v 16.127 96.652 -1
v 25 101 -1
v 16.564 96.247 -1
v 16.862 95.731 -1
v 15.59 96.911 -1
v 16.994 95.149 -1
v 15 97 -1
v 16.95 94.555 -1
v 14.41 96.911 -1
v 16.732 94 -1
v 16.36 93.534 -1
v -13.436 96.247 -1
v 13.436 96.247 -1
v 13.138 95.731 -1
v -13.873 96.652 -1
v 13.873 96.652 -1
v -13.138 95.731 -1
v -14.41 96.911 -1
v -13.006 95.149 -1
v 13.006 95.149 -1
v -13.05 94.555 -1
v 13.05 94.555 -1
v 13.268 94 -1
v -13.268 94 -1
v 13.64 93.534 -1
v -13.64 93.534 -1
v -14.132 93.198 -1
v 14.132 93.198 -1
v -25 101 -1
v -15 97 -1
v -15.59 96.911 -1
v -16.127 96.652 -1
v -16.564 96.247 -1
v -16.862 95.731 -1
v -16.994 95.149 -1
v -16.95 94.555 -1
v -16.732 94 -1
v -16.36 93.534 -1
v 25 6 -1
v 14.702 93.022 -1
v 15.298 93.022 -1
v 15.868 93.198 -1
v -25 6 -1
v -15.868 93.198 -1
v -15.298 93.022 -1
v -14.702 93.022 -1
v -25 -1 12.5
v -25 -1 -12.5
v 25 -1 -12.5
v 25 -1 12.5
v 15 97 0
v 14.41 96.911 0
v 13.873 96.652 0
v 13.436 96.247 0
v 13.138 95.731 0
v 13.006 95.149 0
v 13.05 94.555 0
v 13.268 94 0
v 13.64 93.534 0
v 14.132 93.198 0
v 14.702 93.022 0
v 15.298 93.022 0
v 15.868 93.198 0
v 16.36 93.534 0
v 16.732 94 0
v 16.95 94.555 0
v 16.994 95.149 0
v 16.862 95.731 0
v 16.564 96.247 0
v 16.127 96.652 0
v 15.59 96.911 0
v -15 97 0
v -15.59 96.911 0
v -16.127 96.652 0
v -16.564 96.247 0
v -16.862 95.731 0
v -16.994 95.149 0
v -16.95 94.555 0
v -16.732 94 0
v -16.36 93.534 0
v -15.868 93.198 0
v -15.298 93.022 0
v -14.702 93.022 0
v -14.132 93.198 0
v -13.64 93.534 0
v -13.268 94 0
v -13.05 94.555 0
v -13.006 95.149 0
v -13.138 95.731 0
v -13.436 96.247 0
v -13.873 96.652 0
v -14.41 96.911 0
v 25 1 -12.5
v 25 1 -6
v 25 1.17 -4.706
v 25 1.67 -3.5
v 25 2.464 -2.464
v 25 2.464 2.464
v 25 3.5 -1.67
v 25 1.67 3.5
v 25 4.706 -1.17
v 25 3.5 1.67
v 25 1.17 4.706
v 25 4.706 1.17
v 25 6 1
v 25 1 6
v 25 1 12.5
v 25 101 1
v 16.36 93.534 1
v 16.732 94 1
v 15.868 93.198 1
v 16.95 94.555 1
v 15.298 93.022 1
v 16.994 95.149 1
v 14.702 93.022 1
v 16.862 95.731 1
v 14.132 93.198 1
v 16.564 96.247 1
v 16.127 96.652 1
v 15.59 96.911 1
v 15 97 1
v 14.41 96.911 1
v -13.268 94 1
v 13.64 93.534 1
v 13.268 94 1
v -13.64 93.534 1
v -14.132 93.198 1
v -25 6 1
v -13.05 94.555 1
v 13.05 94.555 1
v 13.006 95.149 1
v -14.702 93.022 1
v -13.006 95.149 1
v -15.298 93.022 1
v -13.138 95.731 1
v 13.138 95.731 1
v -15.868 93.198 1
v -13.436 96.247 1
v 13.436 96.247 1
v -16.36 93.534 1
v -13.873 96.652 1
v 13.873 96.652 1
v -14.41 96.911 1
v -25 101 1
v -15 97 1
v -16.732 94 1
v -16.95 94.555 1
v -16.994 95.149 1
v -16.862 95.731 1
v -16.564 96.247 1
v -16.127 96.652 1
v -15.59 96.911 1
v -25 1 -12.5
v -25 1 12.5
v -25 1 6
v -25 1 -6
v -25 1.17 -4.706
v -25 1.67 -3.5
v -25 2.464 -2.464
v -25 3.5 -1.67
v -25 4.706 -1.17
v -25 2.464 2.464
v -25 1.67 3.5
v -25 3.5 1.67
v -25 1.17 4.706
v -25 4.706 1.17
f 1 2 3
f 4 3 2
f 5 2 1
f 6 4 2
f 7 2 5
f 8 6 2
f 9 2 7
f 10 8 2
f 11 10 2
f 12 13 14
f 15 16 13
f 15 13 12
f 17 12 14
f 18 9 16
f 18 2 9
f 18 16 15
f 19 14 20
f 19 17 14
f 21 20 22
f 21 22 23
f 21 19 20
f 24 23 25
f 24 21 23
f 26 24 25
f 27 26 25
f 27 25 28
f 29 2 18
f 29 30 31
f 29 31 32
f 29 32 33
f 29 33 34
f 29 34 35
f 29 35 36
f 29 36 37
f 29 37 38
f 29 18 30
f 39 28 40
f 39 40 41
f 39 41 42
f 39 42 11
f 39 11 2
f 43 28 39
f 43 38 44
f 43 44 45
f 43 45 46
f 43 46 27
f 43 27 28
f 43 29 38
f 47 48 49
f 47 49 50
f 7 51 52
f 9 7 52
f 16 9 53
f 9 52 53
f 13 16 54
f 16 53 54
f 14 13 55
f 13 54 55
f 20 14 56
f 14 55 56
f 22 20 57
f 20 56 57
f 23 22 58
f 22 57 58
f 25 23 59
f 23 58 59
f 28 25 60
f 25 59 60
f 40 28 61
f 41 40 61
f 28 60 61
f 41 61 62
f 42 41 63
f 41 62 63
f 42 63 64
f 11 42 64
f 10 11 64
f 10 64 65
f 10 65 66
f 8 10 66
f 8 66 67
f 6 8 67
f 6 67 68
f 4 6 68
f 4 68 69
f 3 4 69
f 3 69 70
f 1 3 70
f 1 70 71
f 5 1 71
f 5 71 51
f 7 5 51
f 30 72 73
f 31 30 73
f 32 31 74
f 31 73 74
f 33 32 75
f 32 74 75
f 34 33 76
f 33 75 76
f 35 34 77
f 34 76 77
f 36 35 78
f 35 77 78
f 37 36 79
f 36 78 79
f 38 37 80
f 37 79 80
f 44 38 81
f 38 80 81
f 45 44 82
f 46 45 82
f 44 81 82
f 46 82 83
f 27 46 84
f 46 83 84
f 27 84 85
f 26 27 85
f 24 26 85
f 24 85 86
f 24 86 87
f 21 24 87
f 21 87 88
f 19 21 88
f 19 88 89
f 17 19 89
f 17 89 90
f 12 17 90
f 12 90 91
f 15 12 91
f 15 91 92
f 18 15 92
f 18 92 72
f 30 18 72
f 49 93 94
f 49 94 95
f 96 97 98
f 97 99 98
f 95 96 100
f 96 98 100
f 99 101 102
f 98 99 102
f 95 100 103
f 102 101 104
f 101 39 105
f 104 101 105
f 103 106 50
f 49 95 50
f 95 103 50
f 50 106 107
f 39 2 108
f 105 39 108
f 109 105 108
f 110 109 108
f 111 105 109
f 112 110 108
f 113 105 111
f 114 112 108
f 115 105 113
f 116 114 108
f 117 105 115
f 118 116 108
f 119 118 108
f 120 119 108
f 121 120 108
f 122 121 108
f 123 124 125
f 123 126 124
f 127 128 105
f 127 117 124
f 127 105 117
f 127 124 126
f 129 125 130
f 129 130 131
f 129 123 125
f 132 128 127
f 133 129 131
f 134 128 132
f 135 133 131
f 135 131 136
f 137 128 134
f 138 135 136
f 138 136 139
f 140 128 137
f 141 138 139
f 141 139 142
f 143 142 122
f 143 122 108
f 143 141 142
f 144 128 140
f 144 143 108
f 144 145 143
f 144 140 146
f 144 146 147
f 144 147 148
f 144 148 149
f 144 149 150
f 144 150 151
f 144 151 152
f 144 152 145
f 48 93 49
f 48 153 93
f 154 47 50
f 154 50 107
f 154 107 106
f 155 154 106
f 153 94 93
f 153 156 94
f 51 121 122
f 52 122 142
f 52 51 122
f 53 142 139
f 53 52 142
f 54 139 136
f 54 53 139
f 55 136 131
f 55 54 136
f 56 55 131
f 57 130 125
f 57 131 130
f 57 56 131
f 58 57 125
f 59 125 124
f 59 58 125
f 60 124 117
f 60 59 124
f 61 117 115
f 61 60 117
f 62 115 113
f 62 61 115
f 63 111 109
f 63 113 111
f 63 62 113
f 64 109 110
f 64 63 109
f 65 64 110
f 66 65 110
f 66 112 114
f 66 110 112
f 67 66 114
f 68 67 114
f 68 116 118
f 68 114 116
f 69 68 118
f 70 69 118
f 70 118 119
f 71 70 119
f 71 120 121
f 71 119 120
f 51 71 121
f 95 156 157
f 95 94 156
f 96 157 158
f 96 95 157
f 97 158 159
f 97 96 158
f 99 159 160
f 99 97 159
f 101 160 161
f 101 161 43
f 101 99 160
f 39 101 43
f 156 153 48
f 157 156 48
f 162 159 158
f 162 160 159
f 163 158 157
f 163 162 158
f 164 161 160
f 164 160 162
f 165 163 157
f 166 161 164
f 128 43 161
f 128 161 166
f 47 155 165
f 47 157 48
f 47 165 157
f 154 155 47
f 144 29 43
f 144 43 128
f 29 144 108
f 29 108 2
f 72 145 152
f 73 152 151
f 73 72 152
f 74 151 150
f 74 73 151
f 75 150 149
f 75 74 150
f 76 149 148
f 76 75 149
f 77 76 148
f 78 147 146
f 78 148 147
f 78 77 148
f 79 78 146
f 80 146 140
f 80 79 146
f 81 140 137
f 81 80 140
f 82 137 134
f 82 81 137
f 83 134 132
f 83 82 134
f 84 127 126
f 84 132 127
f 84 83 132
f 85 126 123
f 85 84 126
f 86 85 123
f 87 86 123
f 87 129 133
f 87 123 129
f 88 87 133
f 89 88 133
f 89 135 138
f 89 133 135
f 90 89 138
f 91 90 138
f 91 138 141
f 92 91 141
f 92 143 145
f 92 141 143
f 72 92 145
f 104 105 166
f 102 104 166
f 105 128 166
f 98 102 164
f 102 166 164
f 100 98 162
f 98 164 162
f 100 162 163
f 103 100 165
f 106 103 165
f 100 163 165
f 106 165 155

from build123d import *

# Parameters (mm, degrees)
PAD_DEPTH            = 25
FILLET_R             = 5
SKETCH001_R          = 2
POCKET_DEPTH         = 12.501
POCKET_DEPTH_BACK    = -12.501
BODY_PLACEMENT_ANGLE = 270


with BuildPart() as part:
    # Sketch → Pad (new body, symmetric)
    with BuildSketch(Plane.XY):
        Polygon((-12.5, 1), (-12.5, -1), (12.5, -1), (12.5, 1), (1, 1), (1, 101), (-1, 101), (-1, 1), align=None)
    extrude(amount=PAD_DEPTH, both=True)

    # Fillet
    fillet_edges = [part.edges().sort_by_distance(p)[0] for p in [
        (-1, 1, 0),
        (1, 1, 0),
    ]]
    fillet(fillet_edges, radius=FILLET_R)

    # Sketch001 → Pocket (cut, two sides)
    with BuildSketch(Plane.YZ) as pocket_sk:
        with Locations((95, 15)):
            Circle(SKETCH001_R)
        with Locations((95, -15)):
            Circle(SKETCH001_R)
    extrude(amount=-POCKET_DEPTH, mode=Mode.SUBTRACT)
    extrude(pocket_sk.sketch, amount=-POCKET_DEPTH_BACK, mode=Mode.SUBTRACT)


with BuildPart() as part_1:
    # Body placement: moved
    add(part.part.rotate(Axis((0, 0, 0), (0, 1, 0)), BODY_PLACEMENT_ANGLE))


solid = part_1.part
